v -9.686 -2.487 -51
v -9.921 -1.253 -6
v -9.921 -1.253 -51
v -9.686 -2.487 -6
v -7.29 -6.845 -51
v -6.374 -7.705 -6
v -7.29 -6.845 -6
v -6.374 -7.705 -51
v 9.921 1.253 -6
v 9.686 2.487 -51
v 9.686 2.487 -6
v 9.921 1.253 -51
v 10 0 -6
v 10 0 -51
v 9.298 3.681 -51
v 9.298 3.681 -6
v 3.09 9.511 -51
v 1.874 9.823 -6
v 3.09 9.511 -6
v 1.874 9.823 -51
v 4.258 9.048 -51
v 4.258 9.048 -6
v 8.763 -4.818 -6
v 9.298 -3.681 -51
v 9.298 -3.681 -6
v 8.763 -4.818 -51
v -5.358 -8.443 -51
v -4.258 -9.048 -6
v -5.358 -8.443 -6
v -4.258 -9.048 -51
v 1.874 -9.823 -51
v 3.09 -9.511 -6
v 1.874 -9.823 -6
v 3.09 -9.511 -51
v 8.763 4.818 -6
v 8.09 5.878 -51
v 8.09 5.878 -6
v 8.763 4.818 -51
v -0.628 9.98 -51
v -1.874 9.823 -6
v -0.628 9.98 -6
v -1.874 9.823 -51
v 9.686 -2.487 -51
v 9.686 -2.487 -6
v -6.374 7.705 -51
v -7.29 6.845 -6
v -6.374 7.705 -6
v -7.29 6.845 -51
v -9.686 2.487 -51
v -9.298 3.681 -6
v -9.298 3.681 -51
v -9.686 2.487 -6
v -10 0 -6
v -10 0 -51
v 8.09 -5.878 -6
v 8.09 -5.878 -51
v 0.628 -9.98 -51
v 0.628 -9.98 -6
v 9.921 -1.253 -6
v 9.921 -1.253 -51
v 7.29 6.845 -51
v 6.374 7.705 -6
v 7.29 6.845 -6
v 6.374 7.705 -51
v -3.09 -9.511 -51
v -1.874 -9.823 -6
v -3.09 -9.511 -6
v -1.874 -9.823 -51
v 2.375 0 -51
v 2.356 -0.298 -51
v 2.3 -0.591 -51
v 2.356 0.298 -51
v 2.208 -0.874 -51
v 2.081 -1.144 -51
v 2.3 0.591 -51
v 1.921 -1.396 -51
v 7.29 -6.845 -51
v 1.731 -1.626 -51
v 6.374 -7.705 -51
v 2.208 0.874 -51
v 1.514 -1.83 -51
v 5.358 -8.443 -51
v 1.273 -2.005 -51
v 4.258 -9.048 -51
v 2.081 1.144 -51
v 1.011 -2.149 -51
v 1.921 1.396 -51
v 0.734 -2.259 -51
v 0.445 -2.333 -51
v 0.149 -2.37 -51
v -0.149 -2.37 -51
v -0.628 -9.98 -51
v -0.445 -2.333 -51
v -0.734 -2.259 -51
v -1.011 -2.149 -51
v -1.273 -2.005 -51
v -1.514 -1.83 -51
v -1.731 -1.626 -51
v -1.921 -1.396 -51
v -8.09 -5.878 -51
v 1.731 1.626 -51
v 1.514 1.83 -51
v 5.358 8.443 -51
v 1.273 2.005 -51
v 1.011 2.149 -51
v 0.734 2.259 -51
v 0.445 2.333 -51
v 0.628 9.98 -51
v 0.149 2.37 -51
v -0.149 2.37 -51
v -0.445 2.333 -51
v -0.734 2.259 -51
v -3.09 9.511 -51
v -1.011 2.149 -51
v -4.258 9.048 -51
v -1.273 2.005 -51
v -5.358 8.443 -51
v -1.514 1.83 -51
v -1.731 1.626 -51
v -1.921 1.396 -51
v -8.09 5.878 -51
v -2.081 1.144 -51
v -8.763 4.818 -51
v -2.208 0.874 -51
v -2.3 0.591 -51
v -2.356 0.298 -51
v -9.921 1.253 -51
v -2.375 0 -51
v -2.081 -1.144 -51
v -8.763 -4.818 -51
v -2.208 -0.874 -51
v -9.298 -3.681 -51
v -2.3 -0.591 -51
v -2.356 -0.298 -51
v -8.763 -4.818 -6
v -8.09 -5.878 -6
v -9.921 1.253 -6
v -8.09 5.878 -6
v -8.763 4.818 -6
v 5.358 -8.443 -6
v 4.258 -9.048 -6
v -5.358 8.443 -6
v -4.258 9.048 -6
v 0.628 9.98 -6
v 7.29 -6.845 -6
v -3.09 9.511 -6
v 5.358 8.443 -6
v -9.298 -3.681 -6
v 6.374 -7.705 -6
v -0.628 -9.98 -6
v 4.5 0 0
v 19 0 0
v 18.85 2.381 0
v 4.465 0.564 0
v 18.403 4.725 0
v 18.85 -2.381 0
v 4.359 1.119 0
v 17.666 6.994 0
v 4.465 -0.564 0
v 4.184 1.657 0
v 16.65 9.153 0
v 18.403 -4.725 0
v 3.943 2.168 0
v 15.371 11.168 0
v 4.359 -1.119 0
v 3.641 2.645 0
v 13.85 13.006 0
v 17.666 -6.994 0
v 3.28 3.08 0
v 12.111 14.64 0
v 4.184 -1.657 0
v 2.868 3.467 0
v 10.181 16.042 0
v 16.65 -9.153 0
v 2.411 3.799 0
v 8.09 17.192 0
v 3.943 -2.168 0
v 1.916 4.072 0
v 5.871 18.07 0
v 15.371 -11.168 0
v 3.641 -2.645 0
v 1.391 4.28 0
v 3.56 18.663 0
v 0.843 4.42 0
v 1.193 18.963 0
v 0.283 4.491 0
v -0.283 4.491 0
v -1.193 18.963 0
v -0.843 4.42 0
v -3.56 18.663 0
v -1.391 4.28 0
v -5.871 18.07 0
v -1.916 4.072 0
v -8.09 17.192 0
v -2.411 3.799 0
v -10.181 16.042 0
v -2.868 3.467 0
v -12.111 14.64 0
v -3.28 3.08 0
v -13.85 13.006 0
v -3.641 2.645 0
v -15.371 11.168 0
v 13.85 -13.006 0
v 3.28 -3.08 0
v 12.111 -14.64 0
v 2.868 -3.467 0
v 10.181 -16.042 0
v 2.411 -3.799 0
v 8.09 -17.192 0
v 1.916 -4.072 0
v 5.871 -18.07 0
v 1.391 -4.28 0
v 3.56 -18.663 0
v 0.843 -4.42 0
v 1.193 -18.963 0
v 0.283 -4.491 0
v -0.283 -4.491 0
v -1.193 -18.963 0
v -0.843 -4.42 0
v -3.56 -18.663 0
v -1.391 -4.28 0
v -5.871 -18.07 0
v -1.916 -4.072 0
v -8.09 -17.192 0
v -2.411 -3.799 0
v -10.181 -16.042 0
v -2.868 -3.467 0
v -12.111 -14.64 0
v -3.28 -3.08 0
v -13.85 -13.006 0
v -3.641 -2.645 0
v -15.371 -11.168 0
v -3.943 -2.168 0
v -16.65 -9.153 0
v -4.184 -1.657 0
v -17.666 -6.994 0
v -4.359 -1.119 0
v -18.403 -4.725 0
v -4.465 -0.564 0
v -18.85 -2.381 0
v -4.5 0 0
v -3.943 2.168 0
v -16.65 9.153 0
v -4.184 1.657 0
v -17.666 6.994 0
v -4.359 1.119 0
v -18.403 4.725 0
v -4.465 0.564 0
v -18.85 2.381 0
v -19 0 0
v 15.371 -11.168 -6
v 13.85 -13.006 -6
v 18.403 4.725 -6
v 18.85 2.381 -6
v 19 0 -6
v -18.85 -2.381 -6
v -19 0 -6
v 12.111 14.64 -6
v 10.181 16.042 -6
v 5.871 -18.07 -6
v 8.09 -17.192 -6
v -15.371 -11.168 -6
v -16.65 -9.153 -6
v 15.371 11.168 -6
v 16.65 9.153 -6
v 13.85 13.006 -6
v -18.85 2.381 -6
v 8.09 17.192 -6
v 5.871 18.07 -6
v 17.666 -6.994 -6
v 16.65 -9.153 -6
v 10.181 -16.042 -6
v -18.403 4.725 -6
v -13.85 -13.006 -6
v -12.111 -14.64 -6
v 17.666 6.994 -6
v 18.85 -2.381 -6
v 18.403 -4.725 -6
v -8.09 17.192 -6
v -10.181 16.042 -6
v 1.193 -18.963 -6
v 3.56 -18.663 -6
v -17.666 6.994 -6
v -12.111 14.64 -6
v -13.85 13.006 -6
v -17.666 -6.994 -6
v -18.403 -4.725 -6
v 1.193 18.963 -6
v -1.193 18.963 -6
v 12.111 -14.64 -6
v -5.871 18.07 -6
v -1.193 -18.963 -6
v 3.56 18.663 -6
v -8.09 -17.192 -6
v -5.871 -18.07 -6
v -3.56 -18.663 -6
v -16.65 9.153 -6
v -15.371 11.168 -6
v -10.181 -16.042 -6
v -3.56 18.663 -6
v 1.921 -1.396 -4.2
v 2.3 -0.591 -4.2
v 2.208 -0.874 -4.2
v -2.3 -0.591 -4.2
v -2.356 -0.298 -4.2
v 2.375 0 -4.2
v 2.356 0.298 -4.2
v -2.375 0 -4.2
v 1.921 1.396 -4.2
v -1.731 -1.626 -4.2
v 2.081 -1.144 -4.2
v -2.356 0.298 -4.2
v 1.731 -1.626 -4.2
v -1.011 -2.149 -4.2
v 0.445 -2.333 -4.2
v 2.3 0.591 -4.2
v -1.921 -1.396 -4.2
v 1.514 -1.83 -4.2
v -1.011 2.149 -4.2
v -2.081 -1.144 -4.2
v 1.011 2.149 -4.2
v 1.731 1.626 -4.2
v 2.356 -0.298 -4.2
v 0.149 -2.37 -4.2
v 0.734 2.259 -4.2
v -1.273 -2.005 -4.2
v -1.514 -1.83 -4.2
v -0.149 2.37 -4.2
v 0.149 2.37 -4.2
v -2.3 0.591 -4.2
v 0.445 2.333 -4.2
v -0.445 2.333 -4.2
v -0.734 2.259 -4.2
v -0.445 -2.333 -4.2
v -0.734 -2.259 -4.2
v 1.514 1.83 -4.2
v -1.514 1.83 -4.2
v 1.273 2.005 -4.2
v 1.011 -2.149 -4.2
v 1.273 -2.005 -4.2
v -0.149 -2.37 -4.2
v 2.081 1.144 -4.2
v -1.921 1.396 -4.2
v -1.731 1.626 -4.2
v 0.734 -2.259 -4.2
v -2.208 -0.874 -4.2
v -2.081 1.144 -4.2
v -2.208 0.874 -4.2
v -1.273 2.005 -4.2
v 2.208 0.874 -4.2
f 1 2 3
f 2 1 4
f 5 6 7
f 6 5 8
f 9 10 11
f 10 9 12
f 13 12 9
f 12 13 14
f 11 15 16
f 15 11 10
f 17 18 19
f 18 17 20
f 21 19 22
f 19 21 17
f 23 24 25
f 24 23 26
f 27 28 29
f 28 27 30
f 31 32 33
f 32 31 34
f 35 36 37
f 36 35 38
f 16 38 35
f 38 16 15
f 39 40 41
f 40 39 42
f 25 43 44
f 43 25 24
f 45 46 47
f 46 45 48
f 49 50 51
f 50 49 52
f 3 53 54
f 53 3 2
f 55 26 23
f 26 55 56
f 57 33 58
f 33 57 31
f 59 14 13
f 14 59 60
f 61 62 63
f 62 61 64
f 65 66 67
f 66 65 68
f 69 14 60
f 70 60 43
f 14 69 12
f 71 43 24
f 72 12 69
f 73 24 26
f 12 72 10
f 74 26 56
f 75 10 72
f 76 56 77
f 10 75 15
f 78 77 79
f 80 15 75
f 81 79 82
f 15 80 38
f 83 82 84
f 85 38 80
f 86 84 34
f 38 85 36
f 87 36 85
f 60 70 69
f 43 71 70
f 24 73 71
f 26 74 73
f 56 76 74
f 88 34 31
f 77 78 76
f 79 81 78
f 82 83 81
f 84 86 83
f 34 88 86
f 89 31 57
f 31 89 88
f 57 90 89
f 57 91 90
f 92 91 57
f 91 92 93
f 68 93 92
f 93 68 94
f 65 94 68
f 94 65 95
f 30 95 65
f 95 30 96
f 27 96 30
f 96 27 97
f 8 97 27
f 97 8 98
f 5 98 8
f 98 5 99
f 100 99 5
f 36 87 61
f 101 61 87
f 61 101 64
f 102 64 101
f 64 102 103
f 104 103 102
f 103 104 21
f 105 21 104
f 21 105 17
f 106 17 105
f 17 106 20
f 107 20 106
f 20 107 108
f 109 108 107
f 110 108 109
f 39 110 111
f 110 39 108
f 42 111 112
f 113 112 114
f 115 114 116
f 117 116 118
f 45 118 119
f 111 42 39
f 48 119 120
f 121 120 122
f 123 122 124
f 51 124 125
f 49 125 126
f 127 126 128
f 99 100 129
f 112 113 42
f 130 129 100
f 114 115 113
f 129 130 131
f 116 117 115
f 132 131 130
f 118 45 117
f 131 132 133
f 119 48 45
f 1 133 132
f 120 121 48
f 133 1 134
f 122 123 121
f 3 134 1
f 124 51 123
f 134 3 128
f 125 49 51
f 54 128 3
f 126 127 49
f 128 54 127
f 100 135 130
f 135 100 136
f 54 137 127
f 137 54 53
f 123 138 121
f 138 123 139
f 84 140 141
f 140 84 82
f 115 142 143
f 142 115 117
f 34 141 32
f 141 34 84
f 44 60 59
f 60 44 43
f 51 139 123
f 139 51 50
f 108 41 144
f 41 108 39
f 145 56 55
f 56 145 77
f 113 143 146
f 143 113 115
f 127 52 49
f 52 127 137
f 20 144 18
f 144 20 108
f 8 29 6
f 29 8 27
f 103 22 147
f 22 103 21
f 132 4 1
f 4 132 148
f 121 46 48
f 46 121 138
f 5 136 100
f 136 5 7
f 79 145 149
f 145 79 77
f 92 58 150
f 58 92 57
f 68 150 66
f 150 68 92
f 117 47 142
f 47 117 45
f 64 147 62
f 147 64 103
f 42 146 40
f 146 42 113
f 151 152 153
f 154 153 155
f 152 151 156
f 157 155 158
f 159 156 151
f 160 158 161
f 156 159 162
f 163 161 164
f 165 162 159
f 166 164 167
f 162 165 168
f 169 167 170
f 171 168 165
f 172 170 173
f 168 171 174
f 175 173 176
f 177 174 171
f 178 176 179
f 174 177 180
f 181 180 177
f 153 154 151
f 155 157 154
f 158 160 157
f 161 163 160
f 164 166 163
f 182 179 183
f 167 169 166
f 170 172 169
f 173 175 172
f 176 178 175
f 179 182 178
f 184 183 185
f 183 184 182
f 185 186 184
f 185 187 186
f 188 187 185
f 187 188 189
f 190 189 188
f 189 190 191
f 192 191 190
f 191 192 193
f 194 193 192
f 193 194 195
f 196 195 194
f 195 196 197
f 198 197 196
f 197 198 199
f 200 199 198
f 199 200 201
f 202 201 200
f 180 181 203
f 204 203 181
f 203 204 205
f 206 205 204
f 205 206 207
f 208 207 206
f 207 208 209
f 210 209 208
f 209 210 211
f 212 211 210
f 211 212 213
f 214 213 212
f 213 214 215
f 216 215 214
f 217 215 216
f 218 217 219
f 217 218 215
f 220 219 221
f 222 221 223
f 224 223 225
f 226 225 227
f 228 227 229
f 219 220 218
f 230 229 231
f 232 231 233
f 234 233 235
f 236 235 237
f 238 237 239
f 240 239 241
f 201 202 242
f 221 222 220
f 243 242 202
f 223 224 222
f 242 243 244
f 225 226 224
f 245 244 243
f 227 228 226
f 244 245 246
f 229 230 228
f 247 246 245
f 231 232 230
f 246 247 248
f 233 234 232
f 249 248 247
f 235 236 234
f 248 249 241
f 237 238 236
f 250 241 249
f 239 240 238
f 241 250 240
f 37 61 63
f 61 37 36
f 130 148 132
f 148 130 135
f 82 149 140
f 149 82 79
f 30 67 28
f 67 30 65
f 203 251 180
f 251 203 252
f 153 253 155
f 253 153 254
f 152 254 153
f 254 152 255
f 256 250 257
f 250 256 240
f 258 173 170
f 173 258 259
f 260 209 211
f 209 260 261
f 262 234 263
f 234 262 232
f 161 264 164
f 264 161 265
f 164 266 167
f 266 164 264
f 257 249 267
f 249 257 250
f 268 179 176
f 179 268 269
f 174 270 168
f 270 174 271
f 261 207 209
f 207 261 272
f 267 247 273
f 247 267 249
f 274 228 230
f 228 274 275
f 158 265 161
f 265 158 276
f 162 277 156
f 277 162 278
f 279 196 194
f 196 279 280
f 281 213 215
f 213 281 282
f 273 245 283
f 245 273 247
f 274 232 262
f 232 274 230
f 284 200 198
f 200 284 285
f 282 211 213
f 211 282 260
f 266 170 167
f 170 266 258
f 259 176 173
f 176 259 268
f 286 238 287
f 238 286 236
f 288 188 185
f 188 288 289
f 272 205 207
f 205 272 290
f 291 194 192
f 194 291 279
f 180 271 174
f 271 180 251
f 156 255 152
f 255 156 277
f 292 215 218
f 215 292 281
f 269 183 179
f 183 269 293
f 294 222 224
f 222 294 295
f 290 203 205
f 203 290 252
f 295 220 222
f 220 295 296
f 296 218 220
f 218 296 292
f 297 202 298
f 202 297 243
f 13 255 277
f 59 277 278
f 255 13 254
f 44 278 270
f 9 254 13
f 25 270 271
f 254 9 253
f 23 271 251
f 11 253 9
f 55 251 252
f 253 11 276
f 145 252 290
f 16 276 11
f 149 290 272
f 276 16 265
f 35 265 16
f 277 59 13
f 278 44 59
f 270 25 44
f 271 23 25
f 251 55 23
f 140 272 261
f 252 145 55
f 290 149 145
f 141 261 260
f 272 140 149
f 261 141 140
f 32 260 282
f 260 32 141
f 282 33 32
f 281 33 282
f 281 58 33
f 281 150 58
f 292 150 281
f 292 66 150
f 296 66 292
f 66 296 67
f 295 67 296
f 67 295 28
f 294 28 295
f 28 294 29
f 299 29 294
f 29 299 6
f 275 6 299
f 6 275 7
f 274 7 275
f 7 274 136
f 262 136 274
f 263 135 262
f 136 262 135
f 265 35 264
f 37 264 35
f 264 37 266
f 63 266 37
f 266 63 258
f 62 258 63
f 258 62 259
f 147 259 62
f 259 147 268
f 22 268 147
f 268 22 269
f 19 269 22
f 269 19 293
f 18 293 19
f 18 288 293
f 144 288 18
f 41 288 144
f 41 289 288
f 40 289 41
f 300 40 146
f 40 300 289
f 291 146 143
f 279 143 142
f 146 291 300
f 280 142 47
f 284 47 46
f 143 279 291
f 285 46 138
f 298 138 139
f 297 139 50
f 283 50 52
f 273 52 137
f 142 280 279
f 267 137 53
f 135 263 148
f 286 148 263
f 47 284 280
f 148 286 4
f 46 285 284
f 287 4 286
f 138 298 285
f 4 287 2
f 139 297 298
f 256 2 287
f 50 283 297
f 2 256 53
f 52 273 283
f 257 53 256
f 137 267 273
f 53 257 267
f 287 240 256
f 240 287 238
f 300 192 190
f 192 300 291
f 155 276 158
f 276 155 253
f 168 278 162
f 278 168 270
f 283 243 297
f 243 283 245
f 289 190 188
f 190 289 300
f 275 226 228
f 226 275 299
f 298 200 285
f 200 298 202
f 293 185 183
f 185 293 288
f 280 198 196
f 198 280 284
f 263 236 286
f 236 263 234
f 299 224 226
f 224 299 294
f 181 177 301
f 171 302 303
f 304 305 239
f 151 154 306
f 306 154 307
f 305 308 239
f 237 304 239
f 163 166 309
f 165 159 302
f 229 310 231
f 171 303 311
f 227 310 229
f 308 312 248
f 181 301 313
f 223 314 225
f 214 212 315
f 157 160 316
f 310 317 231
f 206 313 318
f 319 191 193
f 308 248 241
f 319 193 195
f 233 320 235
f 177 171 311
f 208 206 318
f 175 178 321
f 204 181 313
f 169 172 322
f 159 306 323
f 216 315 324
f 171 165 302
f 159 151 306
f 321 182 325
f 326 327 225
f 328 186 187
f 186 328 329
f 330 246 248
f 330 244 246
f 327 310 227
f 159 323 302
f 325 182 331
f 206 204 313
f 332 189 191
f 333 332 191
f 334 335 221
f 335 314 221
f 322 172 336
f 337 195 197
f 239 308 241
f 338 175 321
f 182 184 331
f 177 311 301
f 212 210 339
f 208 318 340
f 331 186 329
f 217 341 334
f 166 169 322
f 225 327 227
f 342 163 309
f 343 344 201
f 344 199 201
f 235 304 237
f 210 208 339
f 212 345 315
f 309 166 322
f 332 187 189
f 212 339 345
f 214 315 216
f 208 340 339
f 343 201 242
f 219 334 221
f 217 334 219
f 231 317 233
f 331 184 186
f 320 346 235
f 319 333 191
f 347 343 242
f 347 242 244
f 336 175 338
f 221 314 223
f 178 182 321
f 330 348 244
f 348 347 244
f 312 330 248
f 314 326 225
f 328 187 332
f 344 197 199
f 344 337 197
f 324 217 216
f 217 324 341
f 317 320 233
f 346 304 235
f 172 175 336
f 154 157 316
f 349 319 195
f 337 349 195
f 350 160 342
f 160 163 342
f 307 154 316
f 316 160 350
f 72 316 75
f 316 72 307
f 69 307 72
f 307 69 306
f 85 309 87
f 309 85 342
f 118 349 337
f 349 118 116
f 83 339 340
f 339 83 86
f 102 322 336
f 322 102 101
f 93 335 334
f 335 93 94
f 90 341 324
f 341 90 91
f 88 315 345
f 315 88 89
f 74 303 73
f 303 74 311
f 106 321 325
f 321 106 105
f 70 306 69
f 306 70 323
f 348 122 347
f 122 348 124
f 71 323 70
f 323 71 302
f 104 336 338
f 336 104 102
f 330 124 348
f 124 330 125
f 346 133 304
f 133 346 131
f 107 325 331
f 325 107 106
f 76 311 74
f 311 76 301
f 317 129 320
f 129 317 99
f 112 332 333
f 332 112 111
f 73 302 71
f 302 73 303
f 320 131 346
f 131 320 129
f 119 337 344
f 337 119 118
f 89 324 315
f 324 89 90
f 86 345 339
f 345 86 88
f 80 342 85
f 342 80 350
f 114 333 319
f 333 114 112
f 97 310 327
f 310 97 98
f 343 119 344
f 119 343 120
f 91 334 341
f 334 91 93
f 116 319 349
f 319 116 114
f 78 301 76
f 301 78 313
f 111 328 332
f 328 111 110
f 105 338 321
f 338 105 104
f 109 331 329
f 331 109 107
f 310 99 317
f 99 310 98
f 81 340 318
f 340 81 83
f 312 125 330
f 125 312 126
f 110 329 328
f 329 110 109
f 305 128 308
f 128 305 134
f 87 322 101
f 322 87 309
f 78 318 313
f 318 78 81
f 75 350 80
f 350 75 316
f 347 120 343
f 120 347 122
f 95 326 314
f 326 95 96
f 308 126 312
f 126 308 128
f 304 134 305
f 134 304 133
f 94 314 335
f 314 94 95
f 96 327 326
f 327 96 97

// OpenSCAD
$fn = 50;


difference() {
	union() {
		translate(v = [0, 0, -51.0000000000]) {
			cylinder(h = 51, r = 10.0000000000);
		}
		translate(v = [0, 0, -6.0000000000]) {
			cylinder(h = 6, r = 19.0000000000);
		}
	}
	union() {
		translate(v = [0, 0, 0]) {
			rotate(a = [0, 0, 0]) {
				difference() {
					union() {
						#translate(v = [0, 0, -51.0000000000]) {
							cylinder(h = 51, r = 2.2500000000);
						}
						#translate(v = [0, 0, -4.2000000000]) {
							cylinder(h = 4.2000000000, r1 = 2.3750000000, r2 = 4.5000000000);
						}
						#translate(v = [0, 0, -51.0000000000]) {
							cylinder(h = 51, r = 2.3750000000);
						}
						#translate(v = [0, 0, -51.0000000000]) {
							cylinder(h = 51, r = 2.2500000000);
						}
					}
					union();
				}
			}
		}
	}
}
